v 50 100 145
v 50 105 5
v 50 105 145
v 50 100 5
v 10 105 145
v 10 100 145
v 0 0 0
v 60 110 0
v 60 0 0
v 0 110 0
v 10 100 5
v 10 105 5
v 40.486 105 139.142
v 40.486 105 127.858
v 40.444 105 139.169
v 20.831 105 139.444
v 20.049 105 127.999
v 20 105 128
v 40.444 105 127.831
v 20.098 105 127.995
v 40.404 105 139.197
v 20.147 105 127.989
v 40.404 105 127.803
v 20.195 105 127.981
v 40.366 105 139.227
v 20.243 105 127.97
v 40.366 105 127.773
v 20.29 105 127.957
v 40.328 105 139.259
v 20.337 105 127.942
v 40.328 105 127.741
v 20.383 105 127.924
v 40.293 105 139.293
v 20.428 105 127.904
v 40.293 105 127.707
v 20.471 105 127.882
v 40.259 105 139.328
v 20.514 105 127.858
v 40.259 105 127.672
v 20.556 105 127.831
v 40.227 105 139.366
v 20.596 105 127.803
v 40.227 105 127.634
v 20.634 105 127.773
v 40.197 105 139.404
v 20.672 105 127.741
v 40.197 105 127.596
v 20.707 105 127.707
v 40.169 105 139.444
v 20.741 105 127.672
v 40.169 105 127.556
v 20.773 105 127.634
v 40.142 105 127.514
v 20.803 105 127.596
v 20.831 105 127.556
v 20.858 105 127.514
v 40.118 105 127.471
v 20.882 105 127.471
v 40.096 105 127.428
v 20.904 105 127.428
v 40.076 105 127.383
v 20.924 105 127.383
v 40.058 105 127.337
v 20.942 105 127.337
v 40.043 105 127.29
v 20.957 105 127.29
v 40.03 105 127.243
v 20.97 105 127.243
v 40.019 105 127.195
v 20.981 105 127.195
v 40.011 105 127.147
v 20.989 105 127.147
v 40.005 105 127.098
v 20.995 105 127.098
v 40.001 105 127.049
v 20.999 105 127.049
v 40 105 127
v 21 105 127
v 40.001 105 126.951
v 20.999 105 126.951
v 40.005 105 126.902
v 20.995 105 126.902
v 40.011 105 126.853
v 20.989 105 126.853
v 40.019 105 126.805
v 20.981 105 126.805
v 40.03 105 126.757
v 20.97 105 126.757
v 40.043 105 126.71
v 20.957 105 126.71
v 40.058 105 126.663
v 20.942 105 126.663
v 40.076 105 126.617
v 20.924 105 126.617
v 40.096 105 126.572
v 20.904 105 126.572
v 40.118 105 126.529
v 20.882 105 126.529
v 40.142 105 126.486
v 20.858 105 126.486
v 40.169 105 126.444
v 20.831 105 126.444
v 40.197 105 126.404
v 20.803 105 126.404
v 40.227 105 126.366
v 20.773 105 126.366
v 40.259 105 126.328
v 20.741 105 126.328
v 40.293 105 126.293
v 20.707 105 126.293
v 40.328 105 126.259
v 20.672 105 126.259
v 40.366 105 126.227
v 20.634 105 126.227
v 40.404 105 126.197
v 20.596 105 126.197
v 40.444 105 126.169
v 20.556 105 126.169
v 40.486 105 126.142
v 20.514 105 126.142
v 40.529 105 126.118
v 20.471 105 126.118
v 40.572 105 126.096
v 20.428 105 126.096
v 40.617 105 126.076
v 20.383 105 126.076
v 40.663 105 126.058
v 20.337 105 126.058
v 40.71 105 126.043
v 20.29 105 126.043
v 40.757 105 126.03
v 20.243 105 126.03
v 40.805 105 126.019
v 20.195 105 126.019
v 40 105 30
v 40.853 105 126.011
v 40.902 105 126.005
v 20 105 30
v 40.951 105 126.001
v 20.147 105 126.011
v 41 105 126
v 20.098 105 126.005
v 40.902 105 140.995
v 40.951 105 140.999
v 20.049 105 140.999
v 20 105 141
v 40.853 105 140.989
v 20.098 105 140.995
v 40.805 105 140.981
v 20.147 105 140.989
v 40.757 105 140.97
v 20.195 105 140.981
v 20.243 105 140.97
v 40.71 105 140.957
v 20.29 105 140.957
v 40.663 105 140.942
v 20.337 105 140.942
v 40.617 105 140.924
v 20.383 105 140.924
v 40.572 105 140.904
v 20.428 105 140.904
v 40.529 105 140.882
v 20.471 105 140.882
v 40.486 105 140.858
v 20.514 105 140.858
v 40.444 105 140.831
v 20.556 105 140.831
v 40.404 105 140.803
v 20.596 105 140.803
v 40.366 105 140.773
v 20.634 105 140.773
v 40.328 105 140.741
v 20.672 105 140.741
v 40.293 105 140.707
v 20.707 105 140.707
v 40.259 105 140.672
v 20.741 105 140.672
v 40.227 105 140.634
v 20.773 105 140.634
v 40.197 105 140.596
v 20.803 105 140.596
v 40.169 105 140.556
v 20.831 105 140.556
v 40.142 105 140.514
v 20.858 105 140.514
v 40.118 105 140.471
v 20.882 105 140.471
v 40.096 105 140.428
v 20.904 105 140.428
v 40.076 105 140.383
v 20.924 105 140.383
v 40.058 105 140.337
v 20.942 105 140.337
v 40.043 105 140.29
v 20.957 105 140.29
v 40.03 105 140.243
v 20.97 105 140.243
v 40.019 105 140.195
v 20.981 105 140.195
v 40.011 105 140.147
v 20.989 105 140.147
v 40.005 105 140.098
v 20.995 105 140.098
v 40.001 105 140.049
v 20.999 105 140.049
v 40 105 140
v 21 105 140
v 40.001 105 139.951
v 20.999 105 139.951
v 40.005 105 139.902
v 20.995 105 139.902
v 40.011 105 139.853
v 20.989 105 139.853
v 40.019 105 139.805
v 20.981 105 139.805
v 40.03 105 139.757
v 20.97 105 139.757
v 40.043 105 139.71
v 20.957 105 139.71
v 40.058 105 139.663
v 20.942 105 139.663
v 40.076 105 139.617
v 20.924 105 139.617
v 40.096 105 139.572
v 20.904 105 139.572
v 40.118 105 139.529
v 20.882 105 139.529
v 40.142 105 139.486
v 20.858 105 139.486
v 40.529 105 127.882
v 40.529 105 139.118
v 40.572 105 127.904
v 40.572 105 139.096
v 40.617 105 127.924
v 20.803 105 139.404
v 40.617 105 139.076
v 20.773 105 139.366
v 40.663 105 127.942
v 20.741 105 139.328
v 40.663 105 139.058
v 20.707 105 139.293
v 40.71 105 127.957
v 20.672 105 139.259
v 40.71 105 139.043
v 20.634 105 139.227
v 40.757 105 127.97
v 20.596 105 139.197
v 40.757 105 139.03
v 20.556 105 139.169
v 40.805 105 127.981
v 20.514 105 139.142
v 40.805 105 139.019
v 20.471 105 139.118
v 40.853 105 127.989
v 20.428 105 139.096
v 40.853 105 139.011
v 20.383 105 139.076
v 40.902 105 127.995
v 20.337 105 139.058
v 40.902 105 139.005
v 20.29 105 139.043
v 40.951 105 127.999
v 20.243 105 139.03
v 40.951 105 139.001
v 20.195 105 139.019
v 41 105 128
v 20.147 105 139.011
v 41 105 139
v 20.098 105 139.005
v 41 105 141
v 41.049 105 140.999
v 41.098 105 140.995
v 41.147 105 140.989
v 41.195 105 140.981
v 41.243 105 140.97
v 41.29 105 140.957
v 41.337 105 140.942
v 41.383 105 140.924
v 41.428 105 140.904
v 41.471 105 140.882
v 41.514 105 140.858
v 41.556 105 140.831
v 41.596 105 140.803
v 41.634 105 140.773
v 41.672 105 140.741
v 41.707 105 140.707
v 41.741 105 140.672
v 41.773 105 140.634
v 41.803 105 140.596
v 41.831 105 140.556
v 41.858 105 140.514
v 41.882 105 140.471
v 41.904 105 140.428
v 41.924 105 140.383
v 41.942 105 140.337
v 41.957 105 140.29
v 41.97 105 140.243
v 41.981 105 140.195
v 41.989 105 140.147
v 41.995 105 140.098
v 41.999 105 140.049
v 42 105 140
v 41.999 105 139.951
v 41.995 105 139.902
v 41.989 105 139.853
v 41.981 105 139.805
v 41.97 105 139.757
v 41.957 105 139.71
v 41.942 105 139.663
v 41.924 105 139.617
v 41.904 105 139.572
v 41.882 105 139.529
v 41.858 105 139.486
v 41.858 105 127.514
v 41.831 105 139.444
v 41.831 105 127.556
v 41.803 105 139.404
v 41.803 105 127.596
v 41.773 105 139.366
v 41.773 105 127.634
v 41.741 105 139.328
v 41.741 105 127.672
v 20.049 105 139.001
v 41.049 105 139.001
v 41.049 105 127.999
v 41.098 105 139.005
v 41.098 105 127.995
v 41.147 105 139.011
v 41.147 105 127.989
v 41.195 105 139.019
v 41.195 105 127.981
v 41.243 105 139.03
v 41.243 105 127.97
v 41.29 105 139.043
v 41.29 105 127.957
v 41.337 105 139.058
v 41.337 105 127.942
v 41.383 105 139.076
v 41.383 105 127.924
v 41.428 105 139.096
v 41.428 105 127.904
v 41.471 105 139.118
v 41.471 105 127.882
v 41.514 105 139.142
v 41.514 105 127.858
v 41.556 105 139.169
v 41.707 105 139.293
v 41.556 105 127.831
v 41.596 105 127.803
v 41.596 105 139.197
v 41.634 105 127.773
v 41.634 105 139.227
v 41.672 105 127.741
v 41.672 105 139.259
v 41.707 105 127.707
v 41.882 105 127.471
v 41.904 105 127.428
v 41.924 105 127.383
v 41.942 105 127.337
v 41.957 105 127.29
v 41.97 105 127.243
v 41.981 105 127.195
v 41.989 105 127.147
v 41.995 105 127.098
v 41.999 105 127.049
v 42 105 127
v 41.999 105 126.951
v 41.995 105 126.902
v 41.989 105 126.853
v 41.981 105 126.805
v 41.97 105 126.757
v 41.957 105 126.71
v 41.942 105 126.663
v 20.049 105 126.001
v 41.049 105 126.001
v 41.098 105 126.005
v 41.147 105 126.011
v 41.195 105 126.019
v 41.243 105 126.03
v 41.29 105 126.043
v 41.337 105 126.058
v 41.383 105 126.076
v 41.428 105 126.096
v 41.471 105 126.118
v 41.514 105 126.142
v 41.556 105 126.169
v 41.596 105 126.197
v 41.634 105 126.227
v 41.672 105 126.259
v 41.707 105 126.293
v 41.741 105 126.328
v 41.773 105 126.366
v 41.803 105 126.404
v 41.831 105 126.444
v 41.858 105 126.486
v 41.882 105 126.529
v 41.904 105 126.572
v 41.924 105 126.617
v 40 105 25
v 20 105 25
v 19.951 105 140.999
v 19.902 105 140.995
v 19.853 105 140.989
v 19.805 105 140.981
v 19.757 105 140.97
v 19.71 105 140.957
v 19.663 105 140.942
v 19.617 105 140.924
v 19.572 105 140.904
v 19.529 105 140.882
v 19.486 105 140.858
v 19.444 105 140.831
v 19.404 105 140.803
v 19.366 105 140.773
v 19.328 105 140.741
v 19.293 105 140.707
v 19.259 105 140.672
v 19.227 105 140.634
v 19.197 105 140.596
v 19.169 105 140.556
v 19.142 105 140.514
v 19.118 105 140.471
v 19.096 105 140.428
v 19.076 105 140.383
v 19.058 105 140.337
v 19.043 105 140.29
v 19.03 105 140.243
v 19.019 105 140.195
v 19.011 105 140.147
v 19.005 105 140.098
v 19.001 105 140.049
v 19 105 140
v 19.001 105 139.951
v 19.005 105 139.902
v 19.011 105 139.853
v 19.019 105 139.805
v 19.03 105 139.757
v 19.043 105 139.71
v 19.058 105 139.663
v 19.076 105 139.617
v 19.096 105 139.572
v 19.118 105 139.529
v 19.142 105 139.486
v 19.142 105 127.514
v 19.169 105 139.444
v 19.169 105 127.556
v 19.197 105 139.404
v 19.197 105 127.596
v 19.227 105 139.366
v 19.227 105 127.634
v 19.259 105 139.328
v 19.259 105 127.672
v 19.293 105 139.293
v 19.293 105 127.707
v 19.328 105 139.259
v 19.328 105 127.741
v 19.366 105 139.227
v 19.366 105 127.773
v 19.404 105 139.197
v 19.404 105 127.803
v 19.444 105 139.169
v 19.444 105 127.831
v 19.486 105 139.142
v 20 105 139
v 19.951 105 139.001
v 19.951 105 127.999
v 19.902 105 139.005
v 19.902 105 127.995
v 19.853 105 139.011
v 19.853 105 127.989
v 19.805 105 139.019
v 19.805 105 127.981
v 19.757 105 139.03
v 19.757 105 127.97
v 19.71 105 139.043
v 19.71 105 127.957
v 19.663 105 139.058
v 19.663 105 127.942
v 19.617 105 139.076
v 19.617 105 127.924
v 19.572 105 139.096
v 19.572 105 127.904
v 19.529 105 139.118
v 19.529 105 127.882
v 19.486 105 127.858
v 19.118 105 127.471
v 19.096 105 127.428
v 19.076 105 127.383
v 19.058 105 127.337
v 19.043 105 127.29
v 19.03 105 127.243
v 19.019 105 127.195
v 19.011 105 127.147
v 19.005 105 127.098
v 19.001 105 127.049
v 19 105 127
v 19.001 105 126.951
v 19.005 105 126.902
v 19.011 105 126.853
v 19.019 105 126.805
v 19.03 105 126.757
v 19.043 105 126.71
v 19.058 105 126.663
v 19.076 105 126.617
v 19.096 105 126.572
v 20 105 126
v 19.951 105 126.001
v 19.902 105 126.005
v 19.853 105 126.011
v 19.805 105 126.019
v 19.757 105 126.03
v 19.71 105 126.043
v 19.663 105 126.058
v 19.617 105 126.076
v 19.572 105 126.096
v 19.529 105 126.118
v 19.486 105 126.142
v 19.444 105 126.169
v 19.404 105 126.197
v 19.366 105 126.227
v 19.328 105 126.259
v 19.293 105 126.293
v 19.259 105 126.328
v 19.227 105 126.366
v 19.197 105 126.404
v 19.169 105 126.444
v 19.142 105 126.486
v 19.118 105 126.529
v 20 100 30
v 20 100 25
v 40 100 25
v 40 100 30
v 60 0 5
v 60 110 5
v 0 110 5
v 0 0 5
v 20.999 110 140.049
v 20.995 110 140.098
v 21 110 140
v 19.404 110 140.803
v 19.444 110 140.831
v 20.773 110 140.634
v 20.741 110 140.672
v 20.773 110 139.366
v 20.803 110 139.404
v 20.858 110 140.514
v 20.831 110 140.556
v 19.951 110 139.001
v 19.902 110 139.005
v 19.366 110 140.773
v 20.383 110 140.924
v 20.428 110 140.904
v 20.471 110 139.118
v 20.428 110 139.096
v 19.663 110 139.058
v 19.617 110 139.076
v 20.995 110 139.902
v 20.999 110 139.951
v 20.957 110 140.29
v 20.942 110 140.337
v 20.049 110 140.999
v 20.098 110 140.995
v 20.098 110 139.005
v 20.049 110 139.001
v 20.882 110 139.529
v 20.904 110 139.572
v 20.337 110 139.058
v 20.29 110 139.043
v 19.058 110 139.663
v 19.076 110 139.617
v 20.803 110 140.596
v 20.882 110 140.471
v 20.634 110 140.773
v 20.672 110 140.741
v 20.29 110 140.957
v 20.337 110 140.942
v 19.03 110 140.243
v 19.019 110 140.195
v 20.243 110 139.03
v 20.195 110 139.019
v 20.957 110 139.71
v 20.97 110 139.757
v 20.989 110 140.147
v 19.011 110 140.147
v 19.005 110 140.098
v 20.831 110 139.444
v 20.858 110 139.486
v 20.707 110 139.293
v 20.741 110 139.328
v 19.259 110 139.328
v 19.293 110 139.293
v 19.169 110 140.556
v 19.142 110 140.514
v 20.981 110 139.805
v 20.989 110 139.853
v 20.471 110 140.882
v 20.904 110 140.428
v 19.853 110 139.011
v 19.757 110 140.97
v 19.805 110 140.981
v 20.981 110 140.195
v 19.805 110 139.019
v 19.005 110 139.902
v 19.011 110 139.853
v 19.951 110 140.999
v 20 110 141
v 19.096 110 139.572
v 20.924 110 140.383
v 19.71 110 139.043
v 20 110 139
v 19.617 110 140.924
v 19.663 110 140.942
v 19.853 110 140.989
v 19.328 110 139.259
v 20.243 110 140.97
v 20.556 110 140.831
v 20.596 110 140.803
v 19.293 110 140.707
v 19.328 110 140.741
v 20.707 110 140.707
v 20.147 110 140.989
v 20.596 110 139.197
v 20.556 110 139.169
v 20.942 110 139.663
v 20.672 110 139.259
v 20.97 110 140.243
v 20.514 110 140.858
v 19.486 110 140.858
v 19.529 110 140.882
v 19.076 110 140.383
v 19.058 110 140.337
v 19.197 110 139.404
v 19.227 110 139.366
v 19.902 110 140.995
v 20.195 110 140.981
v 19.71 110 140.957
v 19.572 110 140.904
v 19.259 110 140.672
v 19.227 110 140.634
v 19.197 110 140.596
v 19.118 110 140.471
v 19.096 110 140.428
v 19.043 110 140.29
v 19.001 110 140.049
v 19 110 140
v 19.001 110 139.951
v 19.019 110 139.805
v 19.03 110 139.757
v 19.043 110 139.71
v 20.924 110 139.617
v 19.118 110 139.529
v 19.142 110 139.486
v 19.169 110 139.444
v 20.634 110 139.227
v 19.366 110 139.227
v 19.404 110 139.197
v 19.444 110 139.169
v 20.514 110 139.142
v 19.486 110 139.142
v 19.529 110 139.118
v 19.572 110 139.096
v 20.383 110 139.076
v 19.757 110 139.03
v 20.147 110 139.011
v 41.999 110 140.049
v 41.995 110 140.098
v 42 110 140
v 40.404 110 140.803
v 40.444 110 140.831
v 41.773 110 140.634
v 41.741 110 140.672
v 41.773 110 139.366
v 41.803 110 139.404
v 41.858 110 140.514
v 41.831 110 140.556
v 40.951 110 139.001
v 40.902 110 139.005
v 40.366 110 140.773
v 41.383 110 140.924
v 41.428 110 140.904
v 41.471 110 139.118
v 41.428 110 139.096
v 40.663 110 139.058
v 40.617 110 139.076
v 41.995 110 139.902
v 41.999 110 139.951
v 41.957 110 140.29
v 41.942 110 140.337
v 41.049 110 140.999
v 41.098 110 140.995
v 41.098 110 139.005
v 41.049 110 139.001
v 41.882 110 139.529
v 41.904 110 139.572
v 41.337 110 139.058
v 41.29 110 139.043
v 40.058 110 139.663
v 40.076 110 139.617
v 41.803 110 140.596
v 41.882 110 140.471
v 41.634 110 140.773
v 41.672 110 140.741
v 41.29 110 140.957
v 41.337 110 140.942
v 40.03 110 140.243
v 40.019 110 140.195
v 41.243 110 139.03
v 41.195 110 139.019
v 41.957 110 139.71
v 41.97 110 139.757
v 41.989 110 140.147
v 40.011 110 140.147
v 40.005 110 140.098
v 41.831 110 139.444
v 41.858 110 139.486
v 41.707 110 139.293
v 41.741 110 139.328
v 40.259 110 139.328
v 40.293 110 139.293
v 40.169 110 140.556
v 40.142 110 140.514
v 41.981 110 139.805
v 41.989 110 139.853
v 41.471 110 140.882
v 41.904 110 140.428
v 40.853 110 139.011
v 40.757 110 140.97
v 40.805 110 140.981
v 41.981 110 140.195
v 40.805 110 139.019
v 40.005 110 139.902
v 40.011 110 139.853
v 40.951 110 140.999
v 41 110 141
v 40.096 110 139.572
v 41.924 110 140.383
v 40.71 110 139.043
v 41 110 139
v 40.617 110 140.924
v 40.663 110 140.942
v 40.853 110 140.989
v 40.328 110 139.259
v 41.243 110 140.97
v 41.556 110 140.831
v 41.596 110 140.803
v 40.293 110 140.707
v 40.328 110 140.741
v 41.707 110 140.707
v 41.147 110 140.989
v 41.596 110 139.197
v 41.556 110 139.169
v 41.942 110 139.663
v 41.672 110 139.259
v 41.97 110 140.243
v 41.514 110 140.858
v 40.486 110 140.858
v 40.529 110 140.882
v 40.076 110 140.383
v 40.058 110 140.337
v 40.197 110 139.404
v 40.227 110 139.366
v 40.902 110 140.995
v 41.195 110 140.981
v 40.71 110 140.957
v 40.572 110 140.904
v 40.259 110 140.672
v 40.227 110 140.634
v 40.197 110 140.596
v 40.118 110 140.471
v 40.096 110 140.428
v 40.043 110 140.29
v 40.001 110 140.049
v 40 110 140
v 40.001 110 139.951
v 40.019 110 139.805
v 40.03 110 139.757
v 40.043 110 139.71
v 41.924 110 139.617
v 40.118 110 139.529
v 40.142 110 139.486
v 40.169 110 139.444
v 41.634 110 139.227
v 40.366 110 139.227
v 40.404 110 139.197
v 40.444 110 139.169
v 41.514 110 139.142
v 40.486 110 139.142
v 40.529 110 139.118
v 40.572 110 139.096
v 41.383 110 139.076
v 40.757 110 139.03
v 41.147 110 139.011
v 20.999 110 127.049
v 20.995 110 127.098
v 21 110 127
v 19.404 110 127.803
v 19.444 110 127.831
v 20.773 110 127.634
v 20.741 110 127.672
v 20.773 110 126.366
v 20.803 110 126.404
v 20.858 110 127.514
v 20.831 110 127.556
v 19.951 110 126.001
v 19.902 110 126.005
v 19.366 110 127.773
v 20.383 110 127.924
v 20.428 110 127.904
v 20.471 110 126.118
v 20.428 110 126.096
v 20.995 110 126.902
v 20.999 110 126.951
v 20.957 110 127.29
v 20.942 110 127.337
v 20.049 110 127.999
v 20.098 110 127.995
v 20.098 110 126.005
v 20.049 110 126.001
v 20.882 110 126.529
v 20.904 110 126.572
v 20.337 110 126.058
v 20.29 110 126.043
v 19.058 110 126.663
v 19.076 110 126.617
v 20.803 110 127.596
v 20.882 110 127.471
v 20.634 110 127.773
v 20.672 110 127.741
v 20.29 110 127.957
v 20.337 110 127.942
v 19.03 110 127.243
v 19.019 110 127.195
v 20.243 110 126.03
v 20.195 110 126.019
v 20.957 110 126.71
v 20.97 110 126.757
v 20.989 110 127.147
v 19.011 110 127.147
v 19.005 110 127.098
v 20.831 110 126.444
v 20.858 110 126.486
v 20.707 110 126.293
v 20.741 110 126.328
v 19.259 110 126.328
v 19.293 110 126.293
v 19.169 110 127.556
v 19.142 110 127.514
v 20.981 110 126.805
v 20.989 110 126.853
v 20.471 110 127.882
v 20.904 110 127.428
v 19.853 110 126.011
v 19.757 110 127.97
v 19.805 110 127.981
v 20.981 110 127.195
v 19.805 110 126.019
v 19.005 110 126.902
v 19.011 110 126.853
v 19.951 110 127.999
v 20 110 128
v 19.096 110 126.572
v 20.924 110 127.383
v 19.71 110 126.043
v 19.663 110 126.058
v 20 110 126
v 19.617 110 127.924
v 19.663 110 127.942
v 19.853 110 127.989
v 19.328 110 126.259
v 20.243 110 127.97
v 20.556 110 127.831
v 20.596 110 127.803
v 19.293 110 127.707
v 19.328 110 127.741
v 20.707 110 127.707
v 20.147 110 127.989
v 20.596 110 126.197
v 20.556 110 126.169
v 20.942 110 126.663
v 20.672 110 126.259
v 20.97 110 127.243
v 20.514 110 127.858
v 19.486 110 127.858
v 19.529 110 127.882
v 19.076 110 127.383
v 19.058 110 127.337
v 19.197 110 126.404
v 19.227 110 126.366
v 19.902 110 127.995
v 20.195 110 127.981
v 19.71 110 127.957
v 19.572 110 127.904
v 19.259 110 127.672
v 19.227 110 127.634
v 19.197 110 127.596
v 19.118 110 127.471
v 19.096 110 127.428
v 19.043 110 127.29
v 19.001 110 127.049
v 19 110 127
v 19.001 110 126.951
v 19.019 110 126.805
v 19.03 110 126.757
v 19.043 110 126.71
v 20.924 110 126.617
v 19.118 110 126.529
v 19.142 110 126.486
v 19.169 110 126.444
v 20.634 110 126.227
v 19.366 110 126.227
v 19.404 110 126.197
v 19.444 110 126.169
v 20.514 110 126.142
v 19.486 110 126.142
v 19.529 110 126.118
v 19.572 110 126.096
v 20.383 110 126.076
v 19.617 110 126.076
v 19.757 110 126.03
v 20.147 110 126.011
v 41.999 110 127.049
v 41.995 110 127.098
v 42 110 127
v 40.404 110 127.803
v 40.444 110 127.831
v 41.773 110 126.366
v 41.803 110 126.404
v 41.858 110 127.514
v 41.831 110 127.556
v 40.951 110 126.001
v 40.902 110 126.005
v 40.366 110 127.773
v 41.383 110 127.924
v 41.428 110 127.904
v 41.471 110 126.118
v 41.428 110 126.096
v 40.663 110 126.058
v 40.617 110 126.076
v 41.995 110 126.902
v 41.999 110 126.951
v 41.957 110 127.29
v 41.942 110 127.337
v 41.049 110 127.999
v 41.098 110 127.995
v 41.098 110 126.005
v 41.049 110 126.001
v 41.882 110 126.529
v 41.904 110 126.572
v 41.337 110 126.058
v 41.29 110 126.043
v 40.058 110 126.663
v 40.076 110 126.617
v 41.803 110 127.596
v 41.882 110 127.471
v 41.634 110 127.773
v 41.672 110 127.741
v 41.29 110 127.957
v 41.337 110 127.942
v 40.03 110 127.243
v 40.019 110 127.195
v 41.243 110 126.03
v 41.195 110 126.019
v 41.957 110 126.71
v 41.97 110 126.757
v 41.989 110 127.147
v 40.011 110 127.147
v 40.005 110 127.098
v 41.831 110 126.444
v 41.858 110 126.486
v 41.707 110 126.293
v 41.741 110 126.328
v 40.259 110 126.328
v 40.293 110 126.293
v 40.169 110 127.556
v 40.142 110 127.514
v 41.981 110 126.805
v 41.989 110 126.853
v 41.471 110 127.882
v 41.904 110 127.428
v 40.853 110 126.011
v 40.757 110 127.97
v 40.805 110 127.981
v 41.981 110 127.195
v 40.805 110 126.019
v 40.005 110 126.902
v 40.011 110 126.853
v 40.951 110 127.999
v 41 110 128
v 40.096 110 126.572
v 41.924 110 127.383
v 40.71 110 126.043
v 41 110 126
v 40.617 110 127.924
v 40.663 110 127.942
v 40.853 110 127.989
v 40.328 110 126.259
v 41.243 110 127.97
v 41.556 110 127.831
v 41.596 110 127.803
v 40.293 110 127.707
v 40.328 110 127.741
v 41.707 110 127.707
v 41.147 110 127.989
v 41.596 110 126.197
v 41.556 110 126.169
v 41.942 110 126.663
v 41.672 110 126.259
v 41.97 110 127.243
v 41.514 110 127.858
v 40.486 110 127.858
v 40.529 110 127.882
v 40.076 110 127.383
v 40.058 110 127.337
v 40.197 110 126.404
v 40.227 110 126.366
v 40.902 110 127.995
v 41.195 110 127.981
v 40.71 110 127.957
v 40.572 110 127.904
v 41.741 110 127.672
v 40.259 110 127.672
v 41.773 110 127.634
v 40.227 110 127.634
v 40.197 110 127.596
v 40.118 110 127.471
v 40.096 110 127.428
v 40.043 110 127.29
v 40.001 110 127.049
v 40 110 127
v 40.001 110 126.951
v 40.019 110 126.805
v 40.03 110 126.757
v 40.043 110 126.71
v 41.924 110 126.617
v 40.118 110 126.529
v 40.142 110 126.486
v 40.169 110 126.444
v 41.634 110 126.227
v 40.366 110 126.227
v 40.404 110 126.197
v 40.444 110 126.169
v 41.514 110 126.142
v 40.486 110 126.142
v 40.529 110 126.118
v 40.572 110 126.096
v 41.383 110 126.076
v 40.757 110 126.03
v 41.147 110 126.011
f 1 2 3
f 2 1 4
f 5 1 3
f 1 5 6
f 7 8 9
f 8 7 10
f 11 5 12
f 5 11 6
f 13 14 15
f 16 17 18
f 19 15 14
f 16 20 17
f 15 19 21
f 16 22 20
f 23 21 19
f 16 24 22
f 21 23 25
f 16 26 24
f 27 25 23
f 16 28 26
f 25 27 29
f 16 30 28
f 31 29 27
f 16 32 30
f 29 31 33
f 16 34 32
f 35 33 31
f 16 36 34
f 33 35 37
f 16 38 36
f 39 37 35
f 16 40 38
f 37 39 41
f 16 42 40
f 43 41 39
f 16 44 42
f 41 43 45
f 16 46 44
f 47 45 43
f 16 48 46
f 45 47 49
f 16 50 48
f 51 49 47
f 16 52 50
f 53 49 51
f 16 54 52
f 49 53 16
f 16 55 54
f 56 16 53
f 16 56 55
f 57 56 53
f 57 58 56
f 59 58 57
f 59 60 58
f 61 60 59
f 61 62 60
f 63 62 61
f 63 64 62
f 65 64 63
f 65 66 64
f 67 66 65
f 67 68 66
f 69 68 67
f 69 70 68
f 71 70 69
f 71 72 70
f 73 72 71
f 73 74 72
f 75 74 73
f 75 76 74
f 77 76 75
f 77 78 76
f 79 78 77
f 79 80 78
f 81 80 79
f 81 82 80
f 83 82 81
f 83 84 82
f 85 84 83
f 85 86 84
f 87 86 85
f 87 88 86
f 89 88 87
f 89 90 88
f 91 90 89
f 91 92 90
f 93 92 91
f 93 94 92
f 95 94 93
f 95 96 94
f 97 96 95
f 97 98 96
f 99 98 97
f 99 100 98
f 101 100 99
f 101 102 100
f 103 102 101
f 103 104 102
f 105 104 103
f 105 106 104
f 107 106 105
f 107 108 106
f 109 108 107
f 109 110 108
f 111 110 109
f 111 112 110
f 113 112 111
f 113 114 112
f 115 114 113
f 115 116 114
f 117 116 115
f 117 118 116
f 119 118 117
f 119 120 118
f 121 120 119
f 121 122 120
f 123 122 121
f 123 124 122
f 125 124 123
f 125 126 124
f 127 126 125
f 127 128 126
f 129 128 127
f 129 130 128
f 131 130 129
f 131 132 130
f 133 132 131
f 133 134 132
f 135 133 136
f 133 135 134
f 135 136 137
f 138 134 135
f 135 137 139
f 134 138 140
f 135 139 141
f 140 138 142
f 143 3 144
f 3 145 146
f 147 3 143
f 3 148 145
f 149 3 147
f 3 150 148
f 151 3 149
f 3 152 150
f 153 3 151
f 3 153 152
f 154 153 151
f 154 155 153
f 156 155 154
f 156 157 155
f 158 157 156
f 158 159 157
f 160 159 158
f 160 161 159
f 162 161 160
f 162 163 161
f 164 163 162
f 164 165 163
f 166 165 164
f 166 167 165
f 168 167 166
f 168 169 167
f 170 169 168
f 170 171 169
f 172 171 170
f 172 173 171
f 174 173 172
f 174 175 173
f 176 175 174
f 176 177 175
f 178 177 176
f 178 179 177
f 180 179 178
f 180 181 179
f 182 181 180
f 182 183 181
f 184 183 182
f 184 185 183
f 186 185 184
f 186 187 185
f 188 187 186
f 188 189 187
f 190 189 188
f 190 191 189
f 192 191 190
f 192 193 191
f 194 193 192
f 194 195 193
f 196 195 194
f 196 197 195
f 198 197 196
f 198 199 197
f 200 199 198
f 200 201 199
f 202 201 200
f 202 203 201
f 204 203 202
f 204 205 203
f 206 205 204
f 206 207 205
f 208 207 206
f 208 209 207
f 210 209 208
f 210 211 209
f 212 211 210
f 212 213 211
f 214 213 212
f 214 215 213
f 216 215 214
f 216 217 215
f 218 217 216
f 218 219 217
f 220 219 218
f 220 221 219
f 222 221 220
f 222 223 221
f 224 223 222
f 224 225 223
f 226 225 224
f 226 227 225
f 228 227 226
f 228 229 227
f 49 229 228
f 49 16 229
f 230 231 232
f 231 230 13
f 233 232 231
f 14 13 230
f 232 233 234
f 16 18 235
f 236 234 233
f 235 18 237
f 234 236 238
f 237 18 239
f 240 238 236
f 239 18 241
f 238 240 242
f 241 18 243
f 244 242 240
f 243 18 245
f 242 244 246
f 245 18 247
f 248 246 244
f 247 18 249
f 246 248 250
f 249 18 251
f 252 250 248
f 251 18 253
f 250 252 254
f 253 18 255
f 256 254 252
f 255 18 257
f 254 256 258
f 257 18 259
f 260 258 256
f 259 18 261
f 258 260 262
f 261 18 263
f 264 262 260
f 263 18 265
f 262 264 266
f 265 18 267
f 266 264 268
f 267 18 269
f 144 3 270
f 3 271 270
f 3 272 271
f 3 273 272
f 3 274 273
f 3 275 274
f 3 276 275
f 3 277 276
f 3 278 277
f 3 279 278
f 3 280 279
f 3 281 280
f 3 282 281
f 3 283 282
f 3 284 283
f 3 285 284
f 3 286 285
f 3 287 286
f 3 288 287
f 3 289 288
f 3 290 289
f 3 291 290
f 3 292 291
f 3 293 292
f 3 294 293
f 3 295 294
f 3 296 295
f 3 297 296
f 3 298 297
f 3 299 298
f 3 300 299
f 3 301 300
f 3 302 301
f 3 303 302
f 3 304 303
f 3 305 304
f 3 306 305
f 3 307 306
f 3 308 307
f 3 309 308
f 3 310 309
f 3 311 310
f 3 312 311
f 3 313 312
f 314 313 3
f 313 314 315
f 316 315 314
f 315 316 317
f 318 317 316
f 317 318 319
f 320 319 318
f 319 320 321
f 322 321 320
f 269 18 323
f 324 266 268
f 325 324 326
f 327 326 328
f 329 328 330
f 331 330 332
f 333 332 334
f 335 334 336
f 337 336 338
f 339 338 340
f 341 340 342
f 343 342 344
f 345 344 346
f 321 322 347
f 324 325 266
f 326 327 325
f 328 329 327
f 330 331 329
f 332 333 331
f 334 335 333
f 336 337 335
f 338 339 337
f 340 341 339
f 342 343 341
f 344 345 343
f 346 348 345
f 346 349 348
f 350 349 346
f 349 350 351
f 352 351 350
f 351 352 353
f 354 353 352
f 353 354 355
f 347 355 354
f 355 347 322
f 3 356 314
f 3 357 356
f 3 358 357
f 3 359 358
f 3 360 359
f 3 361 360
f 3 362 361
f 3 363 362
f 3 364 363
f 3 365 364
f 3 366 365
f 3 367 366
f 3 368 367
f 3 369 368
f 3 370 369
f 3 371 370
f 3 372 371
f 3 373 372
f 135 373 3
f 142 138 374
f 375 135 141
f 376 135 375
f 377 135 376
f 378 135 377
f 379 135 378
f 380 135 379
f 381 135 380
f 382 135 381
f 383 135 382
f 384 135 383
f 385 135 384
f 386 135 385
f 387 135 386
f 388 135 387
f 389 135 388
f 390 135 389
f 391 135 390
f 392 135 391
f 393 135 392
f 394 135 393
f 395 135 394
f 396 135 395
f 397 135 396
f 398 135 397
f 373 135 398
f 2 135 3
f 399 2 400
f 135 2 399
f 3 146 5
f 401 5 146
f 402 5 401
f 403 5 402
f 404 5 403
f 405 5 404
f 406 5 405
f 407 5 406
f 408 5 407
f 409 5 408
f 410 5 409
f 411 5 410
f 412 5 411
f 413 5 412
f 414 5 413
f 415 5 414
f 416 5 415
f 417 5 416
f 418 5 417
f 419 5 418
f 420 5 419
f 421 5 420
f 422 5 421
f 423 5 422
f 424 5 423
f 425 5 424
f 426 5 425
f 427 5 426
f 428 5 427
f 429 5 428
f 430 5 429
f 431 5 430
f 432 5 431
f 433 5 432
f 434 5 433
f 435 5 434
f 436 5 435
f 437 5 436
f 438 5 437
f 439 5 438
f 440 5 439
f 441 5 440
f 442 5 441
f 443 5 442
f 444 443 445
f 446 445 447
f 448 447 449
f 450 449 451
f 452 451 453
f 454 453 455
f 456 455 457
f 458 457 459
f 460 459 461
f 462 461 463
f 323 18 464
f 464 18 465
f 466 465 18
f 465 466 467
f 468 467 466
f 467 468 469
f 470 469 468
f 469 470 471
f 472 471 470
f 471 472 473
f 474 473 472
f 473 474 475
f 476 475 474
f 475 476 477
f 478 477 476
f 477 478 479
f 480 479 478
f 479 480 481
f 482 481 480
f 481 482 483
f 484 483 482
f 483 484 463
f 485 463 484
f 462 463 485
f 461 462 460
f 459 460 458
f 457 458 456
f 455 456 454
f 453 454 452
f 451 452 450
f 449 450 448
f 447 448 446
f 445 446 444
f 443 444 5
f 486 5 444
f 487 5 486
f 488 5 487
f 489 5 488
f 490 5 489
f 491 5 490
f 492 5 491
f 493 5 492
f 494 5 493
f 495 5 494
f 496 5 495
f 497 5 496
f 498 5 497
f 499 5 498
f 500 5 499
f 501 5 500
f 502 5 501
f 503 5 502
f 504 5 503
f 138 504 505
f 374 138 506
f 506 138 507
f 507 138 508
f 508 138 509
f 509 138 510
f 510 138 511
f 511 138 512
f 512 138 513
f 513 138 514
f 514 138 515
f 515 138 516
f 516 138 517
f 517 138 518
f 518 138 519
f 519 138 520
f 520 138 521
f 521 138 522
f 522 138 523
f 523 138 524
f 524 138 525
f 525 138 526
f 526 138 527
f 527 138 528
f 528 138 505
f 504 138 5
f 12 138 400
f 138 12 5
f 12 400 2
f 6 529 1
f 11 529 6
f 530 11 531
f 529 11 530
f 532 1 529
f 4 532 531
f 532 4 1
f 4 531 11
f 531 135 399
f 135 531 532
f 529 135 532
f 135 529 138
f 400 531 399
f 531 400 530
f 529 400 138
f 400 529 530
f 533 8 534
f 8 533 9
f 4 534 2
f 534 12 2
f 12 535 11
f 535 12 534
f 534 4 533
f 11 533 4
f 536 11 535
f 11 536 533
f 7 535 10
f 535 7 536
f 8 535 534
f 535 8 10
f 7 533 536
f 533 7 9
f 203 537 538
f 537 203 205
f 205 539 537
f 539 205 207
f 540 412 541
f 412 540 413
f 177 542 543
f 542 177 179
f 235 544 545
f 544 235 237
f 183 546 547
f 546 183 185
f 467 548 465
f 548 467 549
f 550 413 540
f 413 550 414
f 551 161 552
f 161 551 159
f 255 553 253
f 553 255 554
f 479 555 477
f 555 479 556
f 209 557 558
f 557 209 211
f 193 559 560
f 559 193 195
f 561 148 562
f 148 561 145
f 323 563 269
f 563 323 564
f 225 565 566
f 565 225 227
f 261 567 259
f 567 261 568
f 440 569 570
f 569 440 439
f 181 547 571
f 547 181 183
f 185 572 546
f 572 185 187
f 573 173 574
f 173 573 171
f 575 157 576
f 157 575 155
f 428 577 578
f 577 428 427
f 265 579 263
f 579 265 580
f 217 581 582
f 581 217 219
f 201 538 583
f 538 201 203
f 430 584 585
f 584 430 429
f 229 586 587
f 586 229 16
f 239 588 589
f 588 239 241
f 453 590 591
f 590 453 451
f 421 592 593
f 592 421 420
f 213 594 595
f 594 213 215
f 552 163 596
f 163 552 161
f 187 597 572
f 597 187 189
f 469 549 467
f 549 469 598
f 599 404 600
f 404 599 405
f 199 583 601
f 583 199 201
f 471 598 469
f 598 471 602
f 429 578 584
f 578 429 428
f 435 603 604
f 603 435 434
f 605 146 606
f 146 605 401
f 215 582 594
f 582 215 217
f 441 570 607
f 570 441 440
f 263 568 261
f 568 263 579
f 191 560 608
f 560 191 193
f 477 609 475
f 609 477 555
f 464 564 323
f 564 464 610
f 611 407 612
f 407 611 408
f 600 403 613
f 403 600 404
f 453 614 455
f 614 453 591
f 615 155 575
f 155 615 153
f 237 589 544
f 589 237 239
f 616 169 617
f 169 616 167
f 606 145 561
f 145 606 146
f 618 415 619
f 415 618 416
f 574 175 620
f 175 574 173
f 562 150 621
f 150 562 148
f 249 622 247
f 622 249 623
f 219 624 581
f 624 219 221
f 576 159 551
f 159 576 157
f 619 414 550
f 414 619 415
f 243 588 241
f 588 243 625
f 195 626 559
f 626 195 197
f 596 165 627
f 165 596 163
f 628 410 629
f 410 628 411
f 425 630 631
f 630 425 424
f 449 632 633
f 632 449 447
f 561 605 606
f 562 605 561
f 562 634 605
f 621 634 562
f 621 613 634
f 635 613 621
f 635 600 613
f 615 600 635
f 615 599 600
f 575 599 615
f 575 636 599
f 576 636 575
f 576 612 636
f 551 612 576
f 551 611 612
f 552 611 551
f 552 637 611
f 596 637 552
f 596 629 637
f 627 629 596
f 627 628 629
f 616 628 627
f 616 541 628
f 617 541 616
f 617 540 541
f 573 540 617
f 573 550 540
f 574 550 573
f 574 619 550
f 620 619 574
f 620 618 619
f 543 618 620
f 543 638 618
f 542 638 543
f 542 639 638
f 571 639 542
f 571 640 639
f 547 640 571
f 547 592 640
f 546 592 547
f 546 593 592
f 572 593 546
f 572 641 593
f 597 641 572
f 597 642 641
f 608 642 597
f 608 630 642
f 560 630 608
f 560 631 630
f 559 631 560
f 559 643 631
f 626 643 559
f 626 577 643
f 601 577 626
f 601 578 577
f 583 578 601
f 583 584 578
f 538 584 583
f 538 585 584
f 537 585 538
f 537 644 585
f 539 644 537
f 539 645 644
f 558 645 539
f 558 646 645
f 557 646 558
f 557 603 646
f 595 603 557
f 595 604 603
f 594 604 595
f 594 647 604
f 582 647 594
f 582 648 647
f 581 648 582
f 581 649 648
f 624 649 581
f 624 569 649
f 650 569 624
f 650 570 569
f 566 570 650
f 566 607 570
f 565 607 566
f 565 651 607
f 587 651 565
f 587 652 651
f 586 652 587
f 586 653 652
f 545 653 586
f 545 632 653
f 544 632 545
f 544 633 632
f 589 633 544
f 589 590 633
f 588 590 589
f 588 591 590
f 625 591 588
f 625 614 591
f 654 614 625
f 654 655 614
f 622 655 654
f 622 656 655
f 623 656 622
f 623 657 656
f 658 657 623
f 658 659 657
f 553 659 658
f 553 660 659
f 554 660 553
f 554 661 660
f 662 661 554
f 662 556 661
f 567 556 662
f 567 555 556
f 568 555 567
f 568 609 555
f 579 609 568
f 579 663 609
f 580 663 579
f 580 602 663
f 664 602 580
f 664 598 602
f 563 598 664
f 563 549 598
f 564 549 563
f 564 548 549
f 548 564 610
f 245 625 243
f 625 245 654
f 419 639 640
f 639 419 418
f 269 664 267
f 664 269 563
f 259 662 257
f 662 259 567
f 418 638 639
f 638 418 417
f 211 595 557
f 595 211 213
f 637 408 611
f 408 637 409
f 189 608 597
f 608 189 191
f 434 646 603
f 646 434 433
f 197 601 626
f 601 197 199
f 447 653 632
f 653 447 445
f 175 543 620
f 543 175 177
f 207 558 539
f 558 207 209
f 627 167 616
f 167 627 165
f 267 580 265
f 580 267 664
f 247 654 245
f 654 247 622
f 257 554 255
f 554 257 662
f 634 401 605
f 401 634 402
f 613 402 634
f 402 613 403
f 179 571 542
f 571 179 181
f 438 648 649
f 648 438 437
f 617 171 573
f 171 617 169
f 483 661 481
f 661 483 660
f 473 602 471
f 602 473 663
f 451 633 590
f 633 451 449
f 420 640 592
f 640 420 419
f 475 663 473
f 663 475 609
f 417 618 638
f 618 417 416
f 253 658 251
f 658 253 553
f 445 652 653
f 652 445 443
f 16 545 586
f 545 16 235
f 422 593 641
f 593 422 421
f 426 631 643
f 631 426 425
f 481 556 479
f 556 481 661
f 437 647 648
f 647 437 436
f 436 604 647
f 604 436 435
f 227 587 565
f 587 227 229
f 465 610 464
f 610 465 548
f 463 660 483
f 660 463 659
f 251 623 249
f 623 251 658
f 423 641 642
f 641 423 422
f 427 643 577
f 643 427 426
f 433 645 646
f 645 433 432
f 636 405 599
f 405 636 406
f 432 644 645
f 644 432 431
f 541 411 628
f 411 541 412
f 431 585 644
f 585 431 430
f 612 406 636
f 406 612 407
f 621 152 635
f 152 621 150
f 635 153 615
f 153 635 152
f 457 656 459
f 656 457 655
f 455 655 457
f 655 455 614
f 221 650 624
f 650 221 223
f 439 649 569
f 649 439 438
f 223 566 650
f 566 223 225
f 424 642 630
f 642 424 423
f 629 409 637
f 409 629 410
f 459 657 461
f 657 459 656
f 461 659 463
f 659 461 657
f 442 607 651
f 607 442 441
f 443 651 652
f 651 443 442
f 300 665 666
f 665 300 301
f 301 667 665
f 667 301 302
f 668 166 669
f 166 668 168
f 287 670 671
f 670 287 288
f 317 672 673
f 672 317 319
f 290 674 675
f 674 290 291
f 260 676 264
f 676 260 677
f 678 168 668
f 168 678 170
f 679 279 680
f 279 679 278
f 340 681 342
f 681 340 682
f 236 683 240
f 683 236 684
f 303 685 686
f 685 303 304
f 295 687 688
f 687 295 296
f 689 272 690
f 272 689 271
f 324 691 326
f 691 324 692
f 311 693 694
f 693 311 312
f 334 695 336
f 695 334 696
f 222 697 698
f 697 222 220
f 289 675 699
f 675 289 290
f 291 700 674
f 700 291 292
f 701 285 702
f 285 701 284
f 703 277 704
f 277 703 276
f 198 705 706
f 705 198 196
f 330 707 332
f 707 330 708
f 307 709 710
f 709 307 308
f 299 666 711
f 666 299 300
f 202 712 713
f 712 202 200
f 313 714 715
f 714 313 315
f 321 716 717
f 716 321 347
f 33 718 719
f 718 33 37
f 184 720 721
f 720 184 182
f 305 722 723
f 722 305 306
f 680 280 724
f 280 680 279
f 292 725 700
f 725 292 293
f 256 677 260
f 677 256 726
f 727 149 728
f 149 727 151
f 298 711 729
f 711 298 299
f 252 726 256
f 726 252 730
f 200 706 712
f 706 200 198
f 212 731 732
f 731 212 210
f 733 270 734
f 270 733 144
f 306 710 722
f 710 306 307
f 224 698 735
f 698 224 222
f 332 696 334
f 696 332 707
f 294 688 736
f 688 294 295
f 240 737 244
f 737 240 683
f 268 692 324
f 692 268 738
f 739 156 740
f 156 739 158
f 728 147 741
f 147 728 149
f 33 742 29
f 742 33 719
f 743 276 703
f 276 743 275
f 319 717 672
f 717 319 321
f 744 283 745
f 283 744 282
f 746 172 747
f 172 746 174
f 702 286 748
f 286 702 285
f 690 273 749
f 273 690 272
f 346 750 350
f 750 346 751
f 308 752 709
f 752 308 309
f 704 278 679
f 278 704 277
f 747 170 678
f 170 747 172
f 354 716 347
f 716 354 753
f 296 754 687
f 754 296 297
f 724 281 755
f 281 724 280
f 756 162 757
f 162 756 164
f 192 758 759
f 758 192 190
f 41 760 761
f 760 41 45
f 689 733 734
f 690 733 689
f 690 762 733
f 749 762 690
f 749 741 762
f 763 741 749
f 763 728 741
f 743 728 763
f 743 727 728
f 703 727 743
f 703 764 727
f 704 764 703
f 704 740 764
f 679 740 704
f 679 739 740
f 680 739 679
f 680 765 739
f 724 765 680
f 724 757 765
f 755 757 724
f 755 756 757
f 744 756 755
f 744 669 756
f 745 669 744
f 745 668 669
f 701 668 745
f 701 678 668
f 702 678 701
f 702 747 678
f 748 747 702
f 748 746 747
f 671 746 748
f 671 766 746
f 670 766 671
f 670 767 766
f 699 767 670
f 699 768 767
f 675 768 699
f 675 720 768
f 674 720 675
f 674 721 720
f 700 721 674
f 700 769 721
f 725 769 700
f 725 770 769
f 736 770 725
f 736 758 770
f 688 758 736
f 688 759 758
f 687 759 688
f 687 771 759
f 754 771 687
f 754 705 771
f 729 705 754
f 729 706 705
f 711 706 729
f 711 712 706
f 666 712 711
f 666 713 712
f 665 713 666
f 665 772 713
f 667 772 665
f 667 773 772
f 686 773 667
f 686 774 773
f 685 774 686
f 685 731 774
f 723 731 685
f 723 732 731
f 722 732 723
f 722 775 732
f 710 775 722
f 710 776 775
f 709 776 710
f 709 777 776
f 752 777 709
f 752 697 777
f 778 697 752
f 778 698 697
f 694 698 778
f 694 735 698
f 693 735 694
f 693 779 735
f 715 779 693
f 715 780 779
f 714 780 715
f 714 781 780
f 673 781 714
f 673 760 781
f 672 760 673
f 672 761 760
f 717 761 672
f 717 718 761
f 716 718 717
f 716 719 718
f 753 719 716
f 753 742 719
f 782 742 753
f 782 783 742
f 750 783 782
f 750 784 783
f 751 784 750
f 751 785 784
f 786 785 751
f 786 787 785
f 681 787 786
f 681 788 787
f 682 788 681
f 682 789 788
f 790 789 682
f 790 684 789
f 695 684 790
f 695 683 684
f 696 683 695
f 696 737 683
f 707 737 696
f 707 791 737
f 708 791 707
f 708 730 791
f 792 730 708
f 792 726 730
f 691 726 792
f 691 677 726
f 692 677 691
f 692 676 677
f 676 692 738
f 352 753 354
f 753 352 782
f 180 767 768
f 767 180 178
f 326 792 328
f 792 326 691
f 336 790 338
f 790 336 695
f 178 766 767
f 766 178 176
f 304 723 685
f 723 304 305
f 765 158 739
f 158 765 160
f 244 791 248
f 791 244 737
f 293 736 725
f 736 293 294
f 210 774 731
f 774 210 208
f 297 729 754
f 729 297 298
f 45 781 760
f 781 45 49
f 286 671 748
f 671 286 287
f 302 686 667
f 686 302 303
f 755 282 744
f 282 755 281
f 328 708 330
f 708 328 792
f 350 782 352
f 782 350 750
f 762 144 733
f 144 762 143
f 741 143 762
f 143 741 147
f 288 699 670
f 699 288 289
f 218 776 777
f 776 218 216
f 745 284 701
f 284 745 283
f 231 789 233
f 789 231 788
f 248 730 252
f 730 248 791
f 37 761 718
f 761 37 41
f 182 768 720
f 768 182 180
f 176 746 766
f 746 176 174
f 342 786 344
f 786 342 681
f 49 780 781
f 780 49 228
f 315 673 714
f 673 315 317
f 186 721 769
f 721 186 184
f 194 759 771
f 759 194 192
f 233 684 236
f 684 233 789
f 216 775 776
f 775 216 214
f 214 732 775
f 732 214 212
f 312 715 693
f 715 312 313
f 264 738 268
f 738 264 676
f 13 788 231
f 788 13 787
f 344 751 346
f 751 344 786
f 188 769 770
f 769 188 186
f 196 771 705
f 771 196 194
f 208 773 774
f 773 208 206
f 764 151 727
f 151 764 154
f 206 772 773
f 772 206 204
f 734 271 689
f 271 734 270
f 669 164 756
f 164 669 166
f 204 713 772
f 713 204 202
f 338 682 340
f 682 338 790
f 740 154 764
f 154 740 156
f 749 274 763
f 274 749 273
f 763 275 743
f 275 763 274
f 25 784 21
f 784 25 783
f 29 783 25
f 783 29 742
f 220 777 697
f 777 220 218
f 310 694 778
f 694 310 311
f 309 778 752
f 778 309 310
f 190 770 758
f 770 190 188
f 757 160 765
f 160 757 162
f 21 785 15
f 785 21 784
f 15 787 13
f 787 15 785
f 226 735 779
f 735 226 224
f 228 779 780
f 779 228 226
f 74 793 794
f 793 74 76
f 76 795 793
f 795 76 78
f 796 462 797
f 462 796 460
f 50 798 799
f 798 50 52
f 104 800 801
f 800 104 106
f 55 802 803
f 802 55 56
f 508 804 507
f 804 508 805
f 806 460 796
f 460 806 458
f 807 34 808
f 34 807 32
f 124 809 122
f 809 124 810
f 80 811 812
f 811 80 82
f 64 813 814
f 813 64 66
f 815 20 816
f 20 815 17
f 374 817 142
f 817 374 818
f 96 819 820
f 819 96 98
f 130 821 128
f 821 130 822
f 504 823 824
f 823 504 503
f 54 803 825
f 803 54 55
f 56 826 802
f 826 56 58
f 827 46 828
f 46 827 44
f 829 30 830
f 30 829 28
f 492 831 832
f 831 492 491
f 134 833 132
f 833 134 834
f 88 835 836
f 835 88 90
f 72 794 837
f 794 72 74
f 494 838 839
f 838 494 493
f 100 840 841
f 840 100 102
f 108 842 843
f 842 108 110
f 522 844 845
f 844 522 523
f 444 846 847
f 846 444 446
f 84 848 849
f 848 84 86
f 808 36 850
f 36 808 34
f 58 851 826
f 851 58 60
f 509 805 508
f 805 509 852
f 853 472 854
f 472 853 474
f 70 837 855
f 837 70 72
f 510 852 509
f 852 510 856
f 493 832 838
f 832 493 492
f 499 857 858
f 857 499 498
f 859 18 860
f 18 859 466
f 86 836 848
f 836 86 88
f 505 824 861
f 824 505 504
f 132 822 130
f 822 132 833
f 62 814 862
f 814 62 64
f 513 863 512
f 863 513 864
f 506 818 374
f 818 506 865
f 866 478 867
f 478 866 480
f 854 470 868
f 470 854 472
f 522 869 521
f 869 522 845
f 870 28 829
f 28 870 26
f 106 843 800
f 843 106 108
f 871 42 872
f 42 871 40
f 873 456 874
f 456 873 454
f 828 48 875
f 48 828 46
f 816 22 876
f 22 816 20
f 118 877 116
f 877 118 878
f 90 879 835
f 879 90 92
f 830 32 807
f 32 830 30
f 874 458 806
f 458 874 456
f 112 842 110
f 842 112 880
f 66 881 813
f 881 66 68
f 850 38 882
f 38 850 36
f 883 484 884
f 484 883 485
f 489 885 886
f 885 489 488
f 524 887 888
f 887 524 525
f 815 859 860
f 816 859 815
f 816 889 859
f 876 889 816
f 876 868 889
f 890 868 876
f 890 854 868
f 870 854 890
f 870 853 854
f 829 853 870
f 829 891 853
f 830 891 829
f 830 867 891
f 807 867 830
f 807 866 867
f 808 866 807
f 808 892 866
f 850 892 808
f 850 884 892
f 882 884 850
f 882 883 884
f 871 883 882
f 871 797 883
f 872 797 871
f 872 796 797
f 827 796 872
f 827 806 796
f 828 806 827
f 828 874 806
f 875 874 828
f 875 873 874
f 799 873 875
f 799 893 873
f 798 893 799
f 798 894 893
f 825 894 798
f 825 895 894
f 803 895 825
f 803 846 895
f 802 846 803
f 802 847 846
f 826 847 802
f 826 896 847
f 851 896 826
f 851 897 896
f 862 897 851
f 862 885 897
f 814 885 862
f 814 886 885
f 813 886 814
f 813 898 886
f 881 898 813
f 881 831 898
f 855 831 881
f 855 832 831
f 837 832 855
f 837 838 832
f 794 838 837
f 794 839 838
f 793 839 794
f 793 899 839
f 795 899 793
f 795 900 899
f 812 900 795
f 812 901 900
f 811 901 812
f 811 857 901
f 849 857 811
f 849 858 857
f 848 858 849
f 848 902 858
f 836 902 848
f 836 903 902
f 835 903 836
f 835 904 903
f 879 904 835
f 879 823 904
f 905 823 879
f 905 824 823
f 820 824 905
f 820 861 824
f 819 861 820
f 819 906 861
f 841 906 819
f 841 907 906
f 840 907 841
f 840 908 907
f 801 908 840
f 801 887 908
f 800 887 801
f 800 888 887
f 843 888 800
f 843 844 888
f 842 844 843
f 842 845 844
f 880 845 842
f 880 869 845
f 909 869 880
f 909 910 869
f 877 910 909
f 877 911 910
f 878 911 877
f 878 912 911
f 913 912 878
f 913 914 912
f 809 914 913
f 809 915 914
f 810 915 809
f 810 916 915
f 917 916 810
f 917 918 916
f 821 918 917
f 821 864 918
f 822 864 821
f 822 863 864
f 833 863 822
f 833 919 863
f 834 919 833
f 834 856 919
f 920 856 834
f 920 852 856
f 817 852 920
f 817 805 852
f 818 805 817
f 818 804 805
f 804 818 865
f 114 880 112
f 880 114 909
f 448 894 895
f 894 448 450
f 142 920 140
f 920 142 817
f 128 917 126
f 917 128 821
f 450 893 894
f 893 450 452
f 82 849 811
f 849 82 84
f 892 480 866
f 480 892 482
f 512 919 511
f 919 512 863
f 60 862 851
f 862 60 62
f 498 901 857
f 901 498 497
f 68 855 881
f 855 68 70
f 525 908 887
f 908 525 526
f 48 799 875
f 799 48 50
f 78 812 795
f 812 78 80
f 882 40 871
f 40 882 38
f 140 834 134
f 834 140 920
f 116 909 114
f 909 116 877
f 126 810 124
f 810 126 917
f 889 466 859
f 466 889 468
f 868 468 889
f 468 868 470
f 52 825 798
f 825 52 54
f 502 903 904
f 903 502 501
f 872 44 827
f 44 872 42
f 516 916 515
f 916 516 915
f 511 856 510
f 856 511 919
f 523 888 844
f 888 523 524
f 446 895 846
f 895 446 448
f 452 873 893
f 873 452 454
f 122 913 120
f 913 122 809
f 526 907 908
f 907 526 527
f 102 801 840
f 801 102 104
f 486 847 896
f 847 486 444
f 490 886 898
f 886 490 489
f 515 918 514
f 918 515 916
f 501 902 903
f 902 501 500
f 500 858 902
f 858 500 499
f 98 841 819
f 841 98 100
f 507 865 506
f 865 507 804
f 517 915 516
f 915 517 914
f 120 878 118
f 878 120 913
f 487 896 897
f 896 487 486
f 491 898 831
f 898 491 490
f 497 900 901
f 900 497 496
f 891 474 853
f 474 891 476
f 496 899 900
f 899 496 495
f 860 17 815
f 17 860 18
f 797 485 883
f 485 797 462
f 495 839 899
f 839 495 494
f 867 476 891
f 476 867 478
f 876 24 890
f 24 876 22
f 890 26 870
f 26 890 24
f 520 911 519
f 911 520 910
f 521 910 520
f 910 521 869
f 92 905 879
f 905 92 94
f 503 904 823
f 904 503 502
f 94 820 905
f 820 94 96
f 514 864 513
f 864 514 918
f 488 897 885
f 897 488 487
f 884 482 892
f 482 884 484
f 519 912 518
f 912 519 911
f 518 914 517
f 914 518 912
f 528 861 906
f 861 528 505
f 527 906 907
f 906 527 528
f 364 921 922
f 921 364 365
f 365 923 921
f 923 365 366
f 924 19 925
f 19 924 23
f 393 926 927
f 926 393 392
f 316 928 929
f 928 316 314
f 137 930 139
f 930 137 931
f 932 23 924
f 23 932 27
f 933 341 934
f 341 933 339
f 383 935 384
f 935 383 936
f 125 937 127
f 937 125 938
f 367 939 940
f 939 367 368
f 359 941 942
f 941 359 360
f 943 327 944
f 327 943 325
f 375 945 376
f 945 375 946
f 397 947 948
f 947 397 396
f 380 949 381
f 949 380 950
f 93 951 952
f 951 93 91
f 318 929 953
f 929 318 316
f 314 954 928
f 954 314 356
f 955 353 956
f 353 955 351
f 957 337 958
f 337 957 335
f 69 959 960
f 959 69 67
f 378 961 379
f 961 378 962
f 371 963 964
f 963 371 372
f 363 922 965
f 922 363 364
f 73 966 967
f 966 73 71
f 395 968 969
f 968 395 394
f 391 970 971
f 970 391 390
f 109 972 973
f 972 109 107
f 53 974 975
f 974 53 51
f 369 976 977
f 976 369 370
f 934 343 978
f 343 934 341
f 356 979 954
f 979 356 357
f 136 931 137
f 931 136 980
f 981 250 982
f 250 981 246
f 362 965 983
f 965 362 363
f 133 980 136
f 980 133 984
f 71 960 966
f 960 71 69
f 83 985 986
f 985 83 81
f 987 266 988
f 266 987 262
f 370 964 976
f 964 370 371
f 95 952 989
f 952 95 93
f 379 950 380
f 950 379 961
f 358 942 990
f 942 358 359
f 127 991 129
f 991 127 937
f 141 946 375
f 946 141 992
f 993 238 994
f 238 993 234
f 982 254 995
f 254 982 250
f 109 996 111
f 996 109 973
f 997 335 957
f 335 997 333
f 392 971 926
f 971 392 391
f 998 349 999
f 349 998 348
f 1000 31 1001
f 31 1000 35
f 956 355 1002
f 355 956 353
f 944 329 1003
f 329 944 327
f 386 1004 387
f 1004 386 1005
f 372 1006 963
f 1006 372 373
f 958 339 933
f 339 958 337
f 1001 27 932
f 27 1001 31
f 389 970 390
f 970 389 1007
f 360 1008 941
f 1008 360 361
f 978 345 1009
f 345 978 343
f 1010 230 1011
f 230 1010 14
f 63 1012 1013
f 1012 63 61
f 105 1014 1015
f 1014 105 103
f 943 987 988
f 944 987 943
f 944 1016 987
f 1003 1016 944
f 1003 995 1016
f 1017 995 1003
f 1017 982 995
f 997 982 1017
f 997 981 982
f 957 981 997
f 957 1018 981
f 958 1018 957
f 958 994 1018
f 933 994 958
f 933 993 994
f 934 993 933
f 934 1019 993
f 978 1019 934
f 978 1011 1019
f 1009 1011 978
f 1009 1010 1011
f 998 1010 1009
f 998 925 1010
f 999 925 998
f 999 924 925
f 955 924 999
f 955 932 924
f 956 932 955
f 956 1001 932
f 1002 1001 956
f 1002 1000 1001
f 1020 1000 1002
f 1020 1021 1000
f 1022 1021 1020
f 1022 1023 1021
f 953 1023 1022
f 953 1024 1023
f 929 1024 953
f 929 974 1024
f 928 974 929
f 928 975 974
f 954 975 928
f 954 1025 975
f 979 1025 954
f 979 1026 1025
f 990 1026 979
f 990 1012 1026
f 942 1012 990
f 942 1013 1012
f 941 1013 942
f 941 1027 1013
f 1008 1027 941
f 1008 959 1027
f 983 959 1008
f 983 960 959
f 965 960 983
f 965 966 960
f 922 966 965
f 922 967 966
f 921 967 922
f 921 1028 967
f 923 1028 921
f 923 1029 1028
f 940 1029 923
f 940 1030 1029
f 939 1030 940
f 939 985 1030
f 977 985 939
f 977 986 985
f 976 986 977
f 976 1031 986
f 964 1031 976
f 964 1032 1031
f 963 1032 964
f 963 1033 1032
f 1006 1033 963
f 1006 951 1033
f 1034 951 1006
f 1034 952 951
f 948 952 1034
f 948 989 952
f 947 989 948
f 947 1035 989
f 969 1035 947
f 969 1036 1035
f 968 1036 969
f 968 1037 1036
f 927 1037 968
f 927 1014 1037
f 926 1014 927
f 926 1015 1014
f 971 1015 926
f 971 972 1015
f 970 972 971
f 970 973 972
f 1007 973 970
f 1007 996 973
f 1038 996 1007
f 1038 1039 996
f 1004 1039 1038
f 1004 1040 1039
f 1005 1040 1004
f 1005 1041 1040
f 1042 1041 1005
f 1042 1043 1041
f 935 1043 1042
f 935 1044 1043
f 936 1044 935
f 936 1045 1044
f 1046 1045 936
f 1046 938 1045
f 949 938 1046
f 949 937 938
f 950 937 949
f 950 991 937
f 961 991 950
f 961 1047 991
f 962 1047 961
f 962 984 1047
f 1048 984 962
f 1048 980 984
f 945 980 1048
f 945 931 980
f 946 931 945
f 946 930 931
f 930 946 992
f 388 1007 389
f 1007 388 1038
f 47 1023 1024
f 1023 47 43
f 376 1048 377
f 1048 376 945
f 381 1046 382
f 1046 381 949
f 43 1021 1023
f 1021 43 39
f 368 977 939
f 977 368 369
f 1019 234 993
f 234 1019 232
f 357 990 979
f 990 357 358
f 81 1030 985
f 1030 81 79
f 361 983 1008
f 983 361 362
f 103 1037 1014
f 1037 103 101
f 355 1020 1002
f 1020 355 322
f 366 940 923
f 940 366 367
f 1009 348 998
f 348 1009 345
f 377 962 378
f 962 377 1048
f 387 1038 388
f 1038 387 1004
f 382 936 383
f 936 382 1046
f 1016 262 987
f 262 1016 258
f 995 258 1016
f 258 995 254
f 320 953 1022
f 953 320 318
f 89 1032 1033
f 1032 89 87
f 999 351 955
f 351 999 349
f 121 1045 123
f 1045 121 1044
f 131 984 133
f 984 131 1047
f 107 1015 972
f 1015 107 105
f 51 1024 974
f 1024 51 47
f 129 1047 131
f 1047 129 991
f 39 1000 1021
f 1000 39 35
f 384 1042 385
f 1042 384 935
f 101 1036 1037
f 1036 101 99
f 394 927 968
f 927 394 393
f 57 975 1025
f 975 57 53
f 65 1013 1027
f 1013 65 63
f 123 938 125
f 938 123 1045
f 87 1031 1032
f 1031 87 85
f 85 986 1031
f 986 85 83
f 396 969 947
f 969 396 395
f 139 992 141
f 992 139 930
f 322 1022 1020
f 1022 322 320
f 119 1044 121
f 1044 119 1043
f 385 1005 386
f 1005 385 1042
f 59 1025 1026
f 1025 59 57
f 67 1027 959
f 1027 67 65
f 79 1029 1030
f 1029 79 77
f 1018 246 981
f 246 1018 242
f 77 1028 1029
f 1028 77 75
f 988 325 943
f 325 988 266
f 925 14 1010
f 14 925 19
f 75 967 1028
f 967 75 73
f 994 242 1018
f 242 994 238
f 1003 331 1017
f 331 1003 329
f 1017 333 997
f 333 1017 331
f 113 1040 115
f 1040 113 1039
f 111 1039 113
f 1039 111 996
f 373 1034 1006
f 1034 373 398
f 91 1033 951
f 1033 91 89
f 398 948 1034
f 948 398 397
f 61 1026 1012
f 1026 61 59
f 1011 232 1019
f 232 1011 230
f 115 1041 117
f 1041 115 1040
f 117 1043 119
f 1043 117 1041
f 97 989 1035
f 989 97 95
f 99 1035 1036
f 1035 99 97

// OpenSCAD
$fn=128;
cube([60,110,5]);
difference()
{
  translate([10,100,0]) cube([40,5,145]);
  translate([20,80,25]) cube([20,30,5]);
}
translate([20,110,140]) rotate([90,0,0]) cylinder(h=10,d=2);
translate([41,110,140]) rotate([90,0,0]) cylinder(h=10,d=2);
translate([20,110,127]) rotate([90,0,0]) cylinder(h=10,d=2);
translate([41,110,127]) rotate([90,0,0]) cylinder(h=10,d=2);
